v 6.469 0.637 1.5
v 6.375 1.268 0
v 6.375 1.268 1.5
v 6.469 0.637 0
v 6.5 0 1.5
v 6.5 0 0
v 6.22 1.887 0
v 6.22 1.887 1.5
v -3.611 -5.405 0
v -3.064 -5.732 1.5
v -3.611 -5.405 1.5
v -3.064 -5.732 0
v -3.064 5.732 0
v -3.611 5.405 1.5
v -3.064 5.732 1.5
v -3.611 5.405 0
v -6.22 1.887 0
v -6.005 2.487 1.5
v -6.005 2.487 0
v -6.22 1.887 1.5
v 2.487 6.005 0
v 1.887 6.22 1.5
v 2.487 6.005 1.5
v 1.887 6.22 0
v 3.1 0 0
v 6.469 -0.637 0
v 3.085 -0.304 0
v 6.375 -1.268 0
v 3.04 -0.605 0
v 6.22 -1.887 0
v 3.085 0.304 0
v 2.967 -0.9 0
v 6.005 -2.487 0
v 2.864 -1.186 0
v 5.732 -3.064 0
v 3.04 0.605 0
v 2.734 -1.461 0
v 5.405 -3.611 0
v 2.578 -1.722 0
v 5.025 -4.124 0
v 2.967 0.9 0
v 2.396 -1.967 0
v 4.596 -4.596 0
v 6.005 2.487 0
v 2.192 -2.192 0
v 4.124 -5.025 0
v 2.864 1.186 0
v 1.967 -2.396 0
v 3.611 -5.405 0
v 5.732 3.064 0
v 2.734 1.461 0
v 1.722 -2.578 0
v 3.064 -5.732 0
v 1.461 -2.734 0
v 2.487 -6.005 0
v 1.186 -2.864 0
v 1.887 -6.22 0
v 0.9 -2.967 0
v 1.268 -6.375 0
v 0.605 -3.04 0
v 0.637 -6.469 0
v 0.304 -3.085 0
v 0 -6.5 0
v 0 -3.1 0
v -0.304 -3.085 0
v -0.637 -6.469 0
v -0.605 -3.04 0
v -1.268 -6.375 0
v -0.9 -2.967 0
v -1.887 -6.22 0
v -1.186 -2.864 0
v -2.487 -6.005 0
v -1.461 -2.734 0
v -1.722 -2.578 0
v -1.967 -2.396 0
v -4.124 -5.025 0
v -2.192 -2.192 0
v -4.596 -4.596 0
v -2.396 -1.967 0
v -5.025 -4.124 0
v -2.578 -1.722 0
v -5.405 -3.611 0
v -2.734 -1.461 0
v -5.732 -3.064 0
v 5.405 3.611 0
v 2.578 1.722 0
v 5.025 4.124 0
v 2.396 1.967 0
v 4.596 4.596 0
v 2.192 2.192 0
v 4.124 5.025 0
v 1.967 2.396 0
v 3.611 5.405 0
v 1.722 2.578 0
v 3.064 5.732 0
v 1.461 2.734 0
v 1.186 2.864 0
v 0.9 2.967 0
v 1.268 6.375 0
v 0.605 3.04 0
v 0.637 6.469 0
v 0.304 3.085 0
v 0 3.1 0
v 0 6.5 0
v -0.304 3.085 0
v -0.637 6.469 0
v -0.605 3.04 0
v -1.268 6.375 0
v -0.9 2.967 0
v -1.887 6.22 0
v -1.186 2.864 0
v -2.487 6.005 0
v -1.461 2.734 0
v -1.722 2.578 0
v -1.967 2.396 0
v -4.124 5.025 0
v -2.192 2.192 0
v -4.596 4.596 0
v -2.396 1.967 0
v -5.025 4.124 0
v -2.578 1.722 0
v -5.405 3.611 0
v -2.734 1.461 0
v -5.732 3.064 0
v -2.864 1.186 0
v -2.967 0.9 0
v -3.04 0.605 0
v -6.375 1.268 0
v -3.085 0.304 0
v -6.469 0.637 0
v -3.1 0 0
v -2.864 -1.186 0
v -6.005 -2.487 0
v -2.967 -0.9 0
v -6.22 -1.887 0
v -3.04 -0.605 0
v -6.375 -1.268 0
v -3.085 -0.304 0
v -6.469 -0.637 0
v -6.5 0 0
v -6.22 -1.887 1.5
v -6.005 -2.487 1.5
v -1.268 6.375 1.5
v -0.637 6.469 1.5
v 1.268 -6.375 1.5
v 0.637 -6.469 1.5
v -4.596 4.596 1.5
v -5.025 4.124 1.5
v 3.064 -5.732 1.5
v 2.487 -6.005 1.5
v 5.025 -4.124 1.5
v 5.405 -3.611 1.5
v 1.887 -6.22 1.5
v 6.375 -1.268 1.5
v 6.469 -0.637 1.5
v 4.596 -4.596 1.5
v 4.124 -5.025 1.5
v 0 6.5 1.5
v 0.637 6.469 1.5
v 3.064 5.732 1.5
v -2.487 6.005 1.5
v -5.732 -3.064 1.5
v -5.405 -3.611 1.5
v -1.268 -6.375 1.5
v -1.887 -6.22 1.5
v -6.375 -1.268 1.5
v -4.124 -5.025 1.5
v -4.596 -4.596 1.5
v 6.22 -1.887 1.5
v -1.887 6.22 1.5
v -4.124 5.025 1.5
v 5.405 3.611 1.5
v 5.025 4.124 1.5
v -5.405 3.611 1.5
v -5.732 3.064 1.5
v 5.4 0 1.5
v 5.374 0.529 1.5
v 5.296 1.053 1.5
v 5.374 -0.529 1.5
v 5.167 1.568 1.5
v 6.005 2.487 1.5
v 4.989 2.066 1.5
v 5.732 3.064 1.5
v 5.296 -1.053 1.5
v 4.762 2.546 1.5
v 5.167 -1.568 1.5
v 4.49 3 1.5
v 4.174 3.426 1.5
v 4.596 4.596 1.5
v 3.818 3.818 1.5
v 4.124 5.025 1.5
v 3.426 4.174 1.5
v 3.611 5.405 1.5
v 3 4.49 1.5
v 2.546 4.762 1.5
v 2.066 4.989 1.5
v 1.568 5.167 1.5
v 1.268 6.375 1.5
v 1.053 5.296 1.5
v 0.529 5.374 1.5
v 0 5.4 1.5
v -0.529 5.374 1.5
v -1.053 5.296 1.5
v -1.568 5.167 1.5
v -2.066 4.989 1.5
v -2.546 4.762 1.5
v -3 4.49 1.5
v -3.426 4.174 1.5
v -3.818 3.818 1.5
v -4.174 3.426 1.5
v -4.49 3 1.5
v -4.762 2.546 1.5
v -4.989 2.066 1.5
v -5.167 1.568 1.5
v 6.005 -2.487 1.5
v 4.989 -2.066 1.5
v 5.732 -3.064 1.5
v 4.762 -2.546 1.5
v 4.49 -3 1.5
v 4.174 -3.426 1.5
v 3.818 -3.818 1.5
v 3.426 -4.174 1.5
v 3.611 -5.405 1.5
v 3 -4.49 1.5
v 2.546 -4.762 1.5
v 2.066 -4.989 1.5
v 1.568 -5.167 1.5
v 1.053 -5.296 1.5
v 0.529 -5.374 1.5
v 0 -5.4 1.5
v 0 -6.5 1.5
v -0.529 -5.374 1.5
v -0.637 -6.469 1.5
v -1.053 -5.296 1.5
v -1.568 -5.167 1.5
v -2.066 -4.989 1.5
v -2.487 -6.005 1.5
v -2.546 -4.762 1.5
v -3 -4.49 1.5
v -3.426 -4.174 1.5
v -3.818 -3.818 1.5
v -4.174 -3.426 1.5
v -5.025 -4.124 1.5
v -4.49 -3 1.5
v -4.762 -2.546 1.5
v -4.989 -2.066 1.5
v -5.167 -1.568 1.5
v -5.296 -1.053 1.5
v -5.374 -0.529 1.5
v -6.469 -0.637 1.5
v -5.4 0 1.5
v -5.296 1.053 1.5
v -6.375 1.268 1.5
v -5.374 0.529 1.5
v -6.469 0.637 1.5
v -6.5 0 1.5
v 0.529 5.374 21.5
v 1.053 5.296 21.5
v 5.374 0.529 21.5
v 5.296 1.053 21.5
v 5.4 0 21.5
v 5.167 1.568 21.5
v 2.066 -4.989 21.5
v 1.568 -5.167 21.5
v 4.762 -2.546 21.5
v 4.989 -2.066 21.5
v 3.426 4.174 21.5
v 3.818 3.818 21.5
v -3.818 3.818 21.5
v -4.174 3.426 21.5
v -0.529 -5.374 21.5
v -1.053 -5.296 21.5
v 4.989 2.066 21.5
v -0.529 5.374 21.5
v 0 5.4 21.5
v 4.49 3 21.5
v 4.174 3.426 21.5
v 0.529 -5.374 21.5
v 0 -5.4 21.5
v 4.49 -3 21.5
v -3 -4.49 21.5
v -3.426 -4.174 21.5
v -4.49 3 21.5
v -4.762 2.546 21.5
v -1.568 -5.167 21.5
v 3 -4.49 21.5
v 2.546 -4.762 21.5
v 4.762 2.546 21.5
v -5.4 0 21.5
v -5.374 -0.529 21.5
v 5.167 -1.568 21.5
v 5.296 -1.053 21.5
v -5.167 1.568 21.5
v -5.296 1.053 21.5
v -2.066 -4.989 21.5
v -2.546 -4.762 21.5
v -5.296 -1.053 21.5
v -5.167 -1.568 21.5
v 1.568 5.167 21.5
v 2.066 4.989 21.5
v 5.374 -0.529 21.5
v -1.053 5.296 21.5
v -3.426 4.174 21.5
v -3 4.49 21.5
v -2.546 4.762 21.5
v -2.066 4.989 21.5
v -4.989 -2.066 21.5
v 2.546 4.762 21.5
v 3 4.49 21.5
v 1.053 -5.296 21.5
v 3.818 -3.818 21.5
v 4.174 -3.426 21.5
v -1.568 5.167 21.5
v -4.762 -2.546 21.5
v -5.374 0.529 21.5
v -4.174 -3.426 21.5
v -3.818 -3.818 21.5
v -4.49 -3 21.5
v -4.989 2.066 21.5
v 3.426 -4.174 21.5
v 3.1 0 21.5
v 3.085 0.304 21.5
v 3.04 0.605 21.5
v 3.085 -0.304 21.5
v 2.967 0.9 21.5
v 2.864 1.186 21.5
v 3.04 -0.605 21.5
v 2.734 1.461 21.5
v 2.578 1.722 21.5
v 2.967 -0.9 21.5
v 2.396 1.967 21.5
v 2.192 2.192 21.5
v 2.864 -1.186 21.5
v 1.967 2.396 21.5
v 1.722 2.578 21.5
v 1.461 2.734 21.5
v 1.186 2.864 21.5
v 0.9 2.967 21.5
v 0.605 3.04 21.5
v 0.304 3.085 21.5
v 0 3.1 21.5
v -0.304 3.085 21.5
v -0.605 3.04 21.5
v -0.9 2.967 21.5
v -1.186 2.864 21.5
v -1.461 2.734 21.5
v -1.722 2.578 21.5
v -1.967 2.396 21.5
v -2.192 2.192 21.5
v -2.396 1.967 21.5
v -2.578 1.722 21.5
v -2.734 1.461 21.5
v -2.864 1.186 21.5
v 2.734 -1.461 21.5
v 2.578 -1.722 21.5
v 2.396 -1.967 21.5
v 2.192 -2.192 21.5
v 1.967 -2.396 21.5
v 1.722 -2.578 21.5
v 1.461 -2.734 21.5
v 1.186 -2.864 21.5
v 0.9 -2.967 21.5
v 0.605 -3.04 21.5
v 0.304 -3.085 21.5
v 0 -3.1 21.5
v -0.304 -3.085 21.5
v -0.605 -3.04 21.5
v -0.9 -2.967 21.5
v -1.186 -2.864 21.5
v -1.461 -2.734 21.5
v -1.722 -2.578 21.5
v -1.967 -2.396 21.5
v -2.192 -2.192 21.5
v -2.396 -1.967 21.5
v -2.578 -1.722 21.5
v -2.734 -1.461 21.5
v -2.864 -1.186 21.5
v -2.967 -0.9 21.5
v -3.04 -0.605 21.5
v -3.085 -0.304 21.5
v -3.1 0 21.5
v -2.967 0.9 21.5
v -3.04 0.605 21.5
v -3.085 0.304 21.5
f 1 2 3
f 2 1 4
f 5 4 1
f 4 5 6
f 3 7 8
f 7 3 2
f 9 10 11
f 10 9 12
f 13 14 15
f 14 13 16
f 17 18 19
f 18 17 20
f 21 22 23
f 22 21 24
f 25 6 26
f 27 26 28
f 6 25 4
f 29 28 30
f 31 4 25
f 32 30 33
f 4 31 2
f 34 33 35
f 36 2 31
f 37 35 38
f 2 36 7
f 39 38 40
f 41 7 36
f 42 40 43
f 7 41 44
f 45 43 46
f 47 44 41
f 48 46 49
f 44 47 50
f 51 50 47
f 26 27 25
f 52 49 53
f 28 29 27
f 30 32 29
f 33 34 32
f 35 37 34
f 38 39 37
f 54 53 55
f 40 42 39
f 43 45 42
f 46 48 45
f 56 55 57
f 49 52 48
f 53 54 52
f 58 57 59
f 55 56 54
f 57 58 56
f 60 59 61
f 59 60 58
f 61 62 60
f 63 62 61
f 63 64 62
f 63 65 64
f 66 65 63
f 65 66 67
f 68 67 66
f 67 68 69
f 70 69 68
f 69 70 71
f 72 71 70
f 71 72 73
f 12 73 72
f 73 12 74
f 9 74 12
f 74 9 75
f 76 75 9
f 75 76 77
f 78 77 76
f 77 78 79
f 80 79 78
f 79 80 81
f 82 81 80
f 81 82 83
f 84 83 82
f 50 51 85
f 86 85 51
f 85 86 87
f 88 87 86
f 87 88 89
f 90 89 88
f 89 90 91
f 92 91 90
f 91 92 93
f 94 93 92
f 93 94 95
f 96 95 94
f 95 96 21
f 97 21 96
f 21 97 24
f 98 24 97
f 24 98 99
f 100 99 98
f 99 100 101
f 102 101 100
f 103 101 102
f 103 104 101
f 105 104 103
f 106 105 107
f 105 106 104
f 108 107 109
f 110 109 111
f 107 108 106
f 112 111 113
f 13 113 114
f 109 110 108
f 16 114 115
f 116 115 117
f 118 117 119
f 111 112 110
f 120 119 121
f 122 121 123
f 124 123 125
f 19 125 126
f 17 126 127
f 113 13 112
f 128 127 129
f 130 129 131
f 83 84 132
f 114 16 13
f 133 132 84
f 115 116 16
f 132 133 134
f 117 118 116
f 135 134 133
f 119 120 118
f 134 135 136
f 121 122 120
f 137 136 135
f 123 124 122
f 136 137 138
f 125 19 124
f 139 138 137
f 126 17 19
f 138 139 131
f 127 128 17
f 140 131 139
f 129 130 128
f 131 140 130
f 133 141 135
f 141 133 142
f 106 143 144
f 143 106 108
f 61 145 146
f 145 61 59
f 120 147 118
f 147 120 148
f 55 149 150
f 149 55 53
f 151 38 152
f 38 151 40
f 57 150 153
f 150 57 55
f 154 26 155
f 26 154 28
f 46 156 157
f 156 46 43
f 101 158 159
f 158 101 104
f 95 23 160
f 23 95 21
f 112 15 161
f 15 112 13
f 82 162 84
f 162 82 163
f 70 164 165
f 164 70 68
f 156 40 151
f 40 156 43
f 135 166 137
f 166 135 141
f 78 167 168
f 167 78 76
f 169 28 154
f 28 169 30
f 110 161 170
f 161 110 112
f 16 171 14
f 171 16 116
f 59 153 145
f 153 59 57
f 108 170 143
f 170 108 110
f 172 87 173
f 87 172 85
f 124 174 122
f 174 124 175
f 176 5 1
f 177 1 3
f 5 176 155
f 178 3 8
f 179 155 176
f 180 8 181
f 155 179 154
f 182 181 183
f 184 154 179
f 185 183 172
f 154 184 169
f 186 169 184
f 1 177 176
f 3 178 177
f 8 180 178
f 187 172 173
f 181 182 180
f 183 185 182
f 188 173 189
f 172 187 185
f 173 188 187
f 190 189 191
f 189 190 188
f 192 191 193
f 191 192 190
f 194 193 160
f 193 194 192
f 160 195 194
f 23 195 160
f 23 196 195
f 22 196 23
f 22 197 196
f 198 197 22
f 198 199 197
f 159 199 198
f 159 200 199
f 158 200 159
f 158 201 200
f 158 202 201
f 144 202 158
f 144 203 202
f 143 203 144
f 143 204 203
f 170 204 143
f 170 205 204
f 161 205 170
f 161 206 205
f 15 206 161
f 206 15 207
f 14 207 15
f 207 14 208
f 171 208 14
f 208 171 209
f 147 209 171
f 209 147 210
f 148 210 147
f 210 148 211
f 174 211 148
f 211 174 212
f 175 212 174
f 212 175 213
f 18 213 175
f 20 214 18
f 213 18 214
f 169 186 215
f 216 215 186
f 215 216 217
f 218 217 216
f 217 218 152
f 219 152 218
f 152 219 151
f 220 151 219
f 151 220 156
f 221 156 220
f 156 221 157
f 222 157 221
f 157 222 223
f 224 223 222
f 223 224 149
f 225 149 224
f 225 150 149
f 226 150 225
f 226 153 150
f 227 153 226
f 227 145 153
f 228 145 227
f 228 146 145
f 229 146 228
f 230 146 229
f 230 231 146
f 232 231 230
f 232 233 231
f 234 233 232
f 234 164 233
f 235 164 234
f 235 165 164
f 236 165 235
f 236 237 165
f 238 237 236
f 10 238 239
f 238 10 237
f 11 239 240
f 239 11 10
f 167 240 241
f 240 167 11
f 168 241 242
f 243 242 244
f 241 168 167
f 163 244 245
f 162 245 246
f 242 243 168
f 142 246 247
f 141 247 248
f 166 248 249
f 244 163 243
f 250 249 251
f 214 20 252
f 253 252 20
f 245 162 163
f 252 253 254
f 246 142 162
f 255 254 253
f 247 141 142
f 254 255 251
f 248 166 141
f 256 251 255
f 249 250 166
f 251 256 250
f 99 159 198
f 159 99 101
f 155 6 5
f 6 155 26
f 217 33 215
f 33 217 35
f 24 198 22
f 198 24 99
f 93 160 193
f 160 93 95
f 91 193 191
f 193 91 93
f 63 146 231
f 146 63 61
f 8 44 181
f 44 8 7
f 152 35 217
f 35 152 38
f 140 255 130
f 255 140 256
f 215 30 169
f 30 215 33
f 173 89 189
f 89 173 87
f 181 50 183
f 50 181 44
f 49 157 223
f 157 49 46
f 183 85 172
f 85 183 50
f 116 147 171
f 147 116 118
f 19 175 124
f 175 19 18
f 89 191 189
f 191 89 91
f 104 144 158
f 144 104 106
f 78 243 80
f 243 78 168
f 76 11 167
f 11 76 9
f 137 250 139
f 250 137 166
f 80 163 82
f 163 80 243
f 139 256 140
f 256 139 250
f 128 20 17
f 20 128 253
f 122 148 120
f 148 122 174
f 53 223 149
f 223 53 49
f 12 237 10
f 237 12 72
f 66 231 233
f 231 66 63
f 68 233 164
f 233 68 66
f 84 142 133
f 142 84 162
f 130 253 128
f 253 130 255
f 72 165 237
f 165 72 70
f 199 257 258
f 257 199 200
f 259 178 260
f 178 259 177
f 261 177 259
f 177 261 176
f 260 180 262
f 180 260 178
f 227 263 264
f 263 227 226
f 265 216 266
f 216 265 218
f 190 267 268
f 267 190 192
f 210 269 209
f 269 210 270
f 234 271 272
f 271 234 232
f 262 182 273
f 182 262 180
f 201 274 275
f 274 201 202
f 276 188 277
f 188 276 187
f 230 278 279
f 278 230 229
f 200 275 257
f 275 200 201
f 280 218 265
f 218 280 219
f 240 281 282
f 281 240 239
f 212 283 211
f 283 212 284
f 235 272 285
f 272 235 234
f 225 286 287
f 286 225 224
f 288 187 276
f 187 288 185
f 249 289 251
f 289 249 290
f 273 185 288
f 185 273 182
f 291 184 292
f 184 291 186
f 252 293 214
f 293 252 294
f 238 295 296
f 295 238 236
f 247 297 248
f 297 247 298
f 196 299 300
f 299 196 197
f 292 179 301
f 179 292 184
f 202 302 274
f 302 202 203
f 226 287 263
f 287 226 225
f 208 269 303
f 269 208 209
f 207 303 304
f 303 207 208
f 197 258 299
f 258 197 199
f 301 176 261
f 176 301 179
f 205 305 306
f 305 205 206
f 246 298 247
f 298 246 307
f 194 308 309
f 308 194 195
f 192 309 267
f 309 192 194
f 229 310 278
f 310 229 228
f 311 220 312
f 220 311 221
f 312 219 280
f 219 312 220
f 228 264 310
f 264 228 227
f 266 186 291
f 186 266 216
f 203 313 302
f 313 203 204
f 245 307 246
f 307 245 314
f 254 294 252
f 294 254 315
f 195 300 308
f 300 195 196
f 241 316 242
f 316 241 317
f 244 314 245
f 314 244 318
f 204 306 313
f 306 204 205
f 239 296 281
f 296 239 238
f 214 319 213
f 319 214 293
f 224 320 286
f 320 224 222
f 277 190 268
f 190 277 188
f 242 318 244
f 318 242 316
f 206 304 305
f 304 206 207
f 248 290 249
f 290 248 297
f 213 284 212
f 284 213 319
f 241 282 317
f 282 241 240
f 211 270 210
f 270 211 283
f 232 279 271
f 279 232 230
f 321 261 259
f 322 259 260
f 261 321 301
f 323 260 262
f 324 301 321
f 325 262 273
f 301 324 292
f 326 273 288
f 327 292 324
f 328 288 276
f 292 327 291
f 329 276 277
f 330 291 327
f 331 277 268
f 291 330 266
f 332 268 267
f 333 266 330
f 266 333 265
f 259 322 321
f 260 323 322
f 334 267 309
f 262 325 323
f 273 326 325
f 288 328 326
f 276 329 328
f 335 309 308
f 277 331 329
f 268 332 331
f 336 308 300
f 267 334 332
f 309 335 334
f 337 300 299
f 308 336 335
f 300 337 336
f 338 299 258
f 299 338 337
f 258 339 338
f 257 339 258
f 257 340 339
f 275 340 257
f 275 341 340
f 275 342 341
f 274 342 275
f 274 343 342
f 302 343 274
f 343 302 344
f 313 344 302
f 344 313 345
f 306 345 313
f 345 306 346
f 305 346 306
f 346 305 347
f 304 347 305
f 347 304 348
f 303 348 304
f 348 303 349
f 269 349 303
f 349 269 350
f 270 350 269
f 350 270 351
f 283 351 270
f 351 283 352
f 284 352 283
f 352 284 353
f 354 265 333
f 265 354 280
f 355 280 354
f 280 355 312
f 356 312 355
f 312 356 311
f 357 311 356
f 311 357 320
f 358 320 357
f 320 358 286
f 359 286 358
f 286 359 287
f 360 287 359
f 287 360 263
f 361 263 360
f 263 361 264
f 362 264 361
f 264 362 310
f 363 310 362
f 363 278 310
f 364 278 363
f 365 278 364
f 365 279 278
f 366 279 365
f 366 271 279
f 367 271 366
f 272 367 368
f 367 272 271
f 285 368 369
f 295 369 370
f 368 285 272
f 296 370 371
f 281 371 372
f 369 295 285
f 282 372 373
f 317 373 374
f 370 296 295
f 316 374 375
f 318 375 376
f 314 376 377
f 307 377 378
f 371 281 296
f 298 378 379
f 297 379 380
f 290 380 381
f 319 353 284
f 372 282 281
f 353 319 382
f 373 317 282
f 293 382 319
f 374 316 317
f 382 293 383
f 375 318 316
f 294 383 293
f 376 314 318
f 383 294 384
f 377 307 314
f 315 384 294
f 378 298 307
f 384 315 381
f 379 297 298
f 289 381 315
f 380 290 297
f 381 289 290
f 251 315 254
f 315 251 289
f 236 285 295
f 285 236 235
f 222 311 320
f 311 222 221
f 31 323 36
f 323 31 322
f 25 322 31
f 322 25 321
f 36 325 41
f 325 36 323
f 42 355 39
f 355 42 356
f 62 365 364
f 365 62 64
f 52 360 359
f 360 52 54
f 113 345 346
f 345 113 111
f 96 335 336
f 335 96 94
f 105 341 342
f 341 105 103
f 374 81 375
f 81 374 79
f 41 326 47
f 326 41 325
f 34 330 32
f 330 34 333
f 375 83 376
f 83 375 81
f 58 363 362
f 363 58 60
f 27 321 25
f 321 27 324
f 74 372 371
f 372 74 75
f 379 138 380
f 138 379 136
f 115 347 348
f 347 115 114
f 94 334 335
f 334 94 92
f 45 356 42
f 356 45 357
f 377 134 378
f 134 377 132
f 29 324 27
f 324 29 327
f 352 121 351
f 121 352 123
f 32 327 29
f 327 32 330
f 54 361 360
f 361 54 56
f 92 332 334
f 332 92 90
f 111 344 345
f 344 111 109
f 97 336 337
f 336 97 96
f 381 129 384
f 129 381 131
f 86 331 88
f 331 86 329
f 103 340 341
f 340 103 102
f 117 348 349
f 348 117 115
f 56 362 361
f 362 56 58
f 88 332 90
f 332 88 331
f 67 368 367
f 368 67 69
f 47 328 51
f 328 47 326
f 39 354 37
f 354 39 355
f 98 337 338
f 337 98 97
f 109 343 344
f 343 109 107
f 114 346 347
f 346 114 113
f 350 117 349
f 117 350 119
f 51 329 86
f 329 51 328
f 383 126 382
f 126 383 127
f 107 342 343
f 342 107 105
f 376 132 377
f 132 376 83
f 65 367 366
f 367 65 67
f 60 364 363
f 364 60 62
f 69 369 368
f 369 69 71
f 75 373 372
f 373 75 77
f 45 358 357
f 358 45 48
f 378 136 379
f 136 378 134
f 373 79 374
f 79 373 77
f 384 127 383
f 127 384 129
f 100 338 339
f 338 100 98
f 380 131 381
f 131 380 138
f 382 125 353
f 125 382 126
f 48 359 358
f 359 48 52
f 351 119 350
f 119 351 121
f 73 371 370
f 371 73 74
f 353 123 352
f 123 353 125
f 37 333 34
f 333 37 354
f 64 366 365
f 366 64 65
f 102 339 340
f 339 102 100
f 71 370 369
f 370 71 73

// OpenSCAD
// PCR tube adapter sleeve - print upside down
// Units: mm

$fn = 64;

// ---- Dimensions ----
collar_d        = 13;    // collar outer diameter
collar_t        = 1.5;   // collar thickness (z = 0 to 1.5)
sleeve_od       = 10.8;  // sleeve outer diameter
sleeve_h        = 21.5;  // sleeve total height (z = 0 to 21.5)
bore_d          = 6.2;   // straight through-bore diameter
eps             = 0.5;   // cutter overshoot past faces

// ---- Model ----
difference() {
    union() {
        // Collar on the bed
        cylinder(d = collar_d, h = collar_t);

        // Sleeve body rising from the collar
        translate([0, 0, collar_t])
            cylinder(d = sleeve_od, h = sleeve_h - collar_t);
    }

    // Full-height bore, open at both ends
    translate([0, 0, -eps])
        cylinder(d = bore_d, h = sleeve_h + 2 * eps);
}
